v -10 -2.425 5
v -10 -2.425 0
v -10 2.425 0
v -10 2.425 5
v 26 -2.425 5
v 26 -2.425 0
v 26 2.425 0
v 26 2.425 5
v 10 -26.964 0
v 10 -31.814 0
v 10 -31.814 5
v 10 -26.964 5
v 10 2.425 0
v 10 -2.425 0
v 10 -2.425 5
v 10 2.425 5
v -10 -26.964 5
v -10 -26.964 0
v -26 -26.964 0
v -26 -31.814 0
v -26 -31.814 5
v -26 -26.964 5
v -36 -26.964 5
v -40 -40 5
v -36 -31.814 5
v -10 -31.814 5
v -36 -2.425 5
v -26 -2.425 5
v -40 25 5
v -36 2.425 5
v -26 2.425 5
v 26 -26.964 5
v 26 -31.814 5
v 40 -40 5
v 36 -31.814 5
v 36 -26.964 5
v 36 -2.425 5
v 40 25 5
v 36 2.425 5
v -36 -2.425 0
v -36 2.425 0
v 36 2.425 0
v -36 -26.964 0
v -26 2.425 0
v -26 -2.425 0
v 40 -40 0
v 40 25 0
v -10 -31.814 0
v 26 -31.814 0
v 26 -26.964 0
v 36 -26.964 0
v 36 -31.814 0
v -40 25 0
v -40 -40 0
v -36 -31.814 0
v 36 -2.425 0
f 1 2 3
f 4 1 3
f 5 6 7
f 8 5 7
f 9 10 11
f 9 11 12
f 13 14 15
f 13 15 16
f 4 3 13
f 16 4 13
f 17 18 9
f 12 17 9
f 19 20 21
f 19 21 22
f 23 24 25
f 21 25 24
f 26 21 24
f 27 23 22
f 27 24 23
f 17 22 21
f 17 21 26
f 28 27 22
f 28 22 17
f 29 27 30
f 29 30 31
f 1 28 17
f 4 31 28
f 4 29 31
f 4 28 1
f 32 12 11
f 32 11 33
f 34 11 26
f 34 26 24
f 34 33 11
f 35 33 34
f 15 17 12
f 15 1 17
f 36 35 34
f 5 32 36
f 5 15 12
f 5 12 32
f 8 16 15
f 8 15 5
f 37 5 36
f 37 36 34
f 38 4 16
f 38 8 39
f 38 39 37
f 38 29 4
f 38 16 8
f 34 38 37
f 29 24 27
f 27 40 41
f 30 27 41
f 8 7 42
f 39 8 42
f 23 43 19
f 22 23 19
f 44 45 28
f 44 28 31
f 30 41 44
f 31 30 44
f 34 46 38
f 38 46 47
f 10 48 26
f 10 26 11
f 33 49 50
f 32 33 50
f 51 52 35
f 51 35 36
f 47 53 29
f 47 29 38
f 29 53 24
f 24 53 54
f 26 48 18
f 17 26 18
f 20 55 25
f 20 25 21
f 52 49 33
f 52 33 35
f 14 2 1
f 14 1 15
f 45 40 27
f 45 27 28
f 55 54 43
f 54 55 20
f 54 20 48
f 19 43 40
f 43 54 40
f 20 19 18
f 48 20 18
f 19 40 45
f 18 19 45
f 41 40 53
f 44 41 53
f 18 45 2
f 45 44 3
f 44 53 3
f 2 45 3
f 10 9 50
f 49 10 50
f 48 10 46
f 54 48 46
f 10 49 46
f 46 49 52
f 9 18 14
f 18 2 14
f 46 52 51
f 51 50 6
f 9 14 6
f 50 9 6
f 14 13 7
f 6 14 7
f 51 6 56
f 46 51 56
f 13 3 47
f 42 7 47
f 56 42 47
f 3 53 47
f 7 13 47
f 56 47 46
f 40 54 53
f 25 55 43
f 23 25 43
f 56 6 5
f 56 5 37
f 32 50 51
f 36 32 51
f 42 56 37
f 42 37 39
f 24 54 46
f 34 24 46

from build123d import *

# Parameters (mm, degrees)
F0_W     = 80
F0_H     = 15
F0_W_2   = 10
F0_H_2   = 4.85
F0_W_3   = 20
F0_H_3   = 50
F1_DEPTH = 5


with BuildPart() as f1:
    # F0 (on Top) → F1 (new body)
    with BuildSketch(Plane.XY):
        with Locations((0, -32.5)):
            Rectangle(F0_W, F0_H)
        with Locations((-31, -29.389005)):
            Rectangle(F0_W_2, F0_H_2, mode=Mode.SUBTRACT)
        with Locations((0, -29.389005)):
            Rectangle(F0_W_3, F0_H_2, mode=Mode.SUBTRACT)
        with Locations((31, -29.389005)):
            Rectangle(F0_W_2, F0_H_2, mode=Mode.SUBTRACT)
        Rectangle(F0_W, F0_H_3)
        with Locations((-31, 0)):
            Rectangle(F0_W_2, F0_H_2, mode=Mode.SUBTRACT)
        Rectangle(F0_W_3, F0_H_2, mode=Mode.SUBTRACT)
        with Locations((31, 0)):
            Rectangle(F0_W_2, F0_H_2, mode=Mode.SUBTRACT)
    extrude(amount=F1_DEPTH)


solid = f1.part
